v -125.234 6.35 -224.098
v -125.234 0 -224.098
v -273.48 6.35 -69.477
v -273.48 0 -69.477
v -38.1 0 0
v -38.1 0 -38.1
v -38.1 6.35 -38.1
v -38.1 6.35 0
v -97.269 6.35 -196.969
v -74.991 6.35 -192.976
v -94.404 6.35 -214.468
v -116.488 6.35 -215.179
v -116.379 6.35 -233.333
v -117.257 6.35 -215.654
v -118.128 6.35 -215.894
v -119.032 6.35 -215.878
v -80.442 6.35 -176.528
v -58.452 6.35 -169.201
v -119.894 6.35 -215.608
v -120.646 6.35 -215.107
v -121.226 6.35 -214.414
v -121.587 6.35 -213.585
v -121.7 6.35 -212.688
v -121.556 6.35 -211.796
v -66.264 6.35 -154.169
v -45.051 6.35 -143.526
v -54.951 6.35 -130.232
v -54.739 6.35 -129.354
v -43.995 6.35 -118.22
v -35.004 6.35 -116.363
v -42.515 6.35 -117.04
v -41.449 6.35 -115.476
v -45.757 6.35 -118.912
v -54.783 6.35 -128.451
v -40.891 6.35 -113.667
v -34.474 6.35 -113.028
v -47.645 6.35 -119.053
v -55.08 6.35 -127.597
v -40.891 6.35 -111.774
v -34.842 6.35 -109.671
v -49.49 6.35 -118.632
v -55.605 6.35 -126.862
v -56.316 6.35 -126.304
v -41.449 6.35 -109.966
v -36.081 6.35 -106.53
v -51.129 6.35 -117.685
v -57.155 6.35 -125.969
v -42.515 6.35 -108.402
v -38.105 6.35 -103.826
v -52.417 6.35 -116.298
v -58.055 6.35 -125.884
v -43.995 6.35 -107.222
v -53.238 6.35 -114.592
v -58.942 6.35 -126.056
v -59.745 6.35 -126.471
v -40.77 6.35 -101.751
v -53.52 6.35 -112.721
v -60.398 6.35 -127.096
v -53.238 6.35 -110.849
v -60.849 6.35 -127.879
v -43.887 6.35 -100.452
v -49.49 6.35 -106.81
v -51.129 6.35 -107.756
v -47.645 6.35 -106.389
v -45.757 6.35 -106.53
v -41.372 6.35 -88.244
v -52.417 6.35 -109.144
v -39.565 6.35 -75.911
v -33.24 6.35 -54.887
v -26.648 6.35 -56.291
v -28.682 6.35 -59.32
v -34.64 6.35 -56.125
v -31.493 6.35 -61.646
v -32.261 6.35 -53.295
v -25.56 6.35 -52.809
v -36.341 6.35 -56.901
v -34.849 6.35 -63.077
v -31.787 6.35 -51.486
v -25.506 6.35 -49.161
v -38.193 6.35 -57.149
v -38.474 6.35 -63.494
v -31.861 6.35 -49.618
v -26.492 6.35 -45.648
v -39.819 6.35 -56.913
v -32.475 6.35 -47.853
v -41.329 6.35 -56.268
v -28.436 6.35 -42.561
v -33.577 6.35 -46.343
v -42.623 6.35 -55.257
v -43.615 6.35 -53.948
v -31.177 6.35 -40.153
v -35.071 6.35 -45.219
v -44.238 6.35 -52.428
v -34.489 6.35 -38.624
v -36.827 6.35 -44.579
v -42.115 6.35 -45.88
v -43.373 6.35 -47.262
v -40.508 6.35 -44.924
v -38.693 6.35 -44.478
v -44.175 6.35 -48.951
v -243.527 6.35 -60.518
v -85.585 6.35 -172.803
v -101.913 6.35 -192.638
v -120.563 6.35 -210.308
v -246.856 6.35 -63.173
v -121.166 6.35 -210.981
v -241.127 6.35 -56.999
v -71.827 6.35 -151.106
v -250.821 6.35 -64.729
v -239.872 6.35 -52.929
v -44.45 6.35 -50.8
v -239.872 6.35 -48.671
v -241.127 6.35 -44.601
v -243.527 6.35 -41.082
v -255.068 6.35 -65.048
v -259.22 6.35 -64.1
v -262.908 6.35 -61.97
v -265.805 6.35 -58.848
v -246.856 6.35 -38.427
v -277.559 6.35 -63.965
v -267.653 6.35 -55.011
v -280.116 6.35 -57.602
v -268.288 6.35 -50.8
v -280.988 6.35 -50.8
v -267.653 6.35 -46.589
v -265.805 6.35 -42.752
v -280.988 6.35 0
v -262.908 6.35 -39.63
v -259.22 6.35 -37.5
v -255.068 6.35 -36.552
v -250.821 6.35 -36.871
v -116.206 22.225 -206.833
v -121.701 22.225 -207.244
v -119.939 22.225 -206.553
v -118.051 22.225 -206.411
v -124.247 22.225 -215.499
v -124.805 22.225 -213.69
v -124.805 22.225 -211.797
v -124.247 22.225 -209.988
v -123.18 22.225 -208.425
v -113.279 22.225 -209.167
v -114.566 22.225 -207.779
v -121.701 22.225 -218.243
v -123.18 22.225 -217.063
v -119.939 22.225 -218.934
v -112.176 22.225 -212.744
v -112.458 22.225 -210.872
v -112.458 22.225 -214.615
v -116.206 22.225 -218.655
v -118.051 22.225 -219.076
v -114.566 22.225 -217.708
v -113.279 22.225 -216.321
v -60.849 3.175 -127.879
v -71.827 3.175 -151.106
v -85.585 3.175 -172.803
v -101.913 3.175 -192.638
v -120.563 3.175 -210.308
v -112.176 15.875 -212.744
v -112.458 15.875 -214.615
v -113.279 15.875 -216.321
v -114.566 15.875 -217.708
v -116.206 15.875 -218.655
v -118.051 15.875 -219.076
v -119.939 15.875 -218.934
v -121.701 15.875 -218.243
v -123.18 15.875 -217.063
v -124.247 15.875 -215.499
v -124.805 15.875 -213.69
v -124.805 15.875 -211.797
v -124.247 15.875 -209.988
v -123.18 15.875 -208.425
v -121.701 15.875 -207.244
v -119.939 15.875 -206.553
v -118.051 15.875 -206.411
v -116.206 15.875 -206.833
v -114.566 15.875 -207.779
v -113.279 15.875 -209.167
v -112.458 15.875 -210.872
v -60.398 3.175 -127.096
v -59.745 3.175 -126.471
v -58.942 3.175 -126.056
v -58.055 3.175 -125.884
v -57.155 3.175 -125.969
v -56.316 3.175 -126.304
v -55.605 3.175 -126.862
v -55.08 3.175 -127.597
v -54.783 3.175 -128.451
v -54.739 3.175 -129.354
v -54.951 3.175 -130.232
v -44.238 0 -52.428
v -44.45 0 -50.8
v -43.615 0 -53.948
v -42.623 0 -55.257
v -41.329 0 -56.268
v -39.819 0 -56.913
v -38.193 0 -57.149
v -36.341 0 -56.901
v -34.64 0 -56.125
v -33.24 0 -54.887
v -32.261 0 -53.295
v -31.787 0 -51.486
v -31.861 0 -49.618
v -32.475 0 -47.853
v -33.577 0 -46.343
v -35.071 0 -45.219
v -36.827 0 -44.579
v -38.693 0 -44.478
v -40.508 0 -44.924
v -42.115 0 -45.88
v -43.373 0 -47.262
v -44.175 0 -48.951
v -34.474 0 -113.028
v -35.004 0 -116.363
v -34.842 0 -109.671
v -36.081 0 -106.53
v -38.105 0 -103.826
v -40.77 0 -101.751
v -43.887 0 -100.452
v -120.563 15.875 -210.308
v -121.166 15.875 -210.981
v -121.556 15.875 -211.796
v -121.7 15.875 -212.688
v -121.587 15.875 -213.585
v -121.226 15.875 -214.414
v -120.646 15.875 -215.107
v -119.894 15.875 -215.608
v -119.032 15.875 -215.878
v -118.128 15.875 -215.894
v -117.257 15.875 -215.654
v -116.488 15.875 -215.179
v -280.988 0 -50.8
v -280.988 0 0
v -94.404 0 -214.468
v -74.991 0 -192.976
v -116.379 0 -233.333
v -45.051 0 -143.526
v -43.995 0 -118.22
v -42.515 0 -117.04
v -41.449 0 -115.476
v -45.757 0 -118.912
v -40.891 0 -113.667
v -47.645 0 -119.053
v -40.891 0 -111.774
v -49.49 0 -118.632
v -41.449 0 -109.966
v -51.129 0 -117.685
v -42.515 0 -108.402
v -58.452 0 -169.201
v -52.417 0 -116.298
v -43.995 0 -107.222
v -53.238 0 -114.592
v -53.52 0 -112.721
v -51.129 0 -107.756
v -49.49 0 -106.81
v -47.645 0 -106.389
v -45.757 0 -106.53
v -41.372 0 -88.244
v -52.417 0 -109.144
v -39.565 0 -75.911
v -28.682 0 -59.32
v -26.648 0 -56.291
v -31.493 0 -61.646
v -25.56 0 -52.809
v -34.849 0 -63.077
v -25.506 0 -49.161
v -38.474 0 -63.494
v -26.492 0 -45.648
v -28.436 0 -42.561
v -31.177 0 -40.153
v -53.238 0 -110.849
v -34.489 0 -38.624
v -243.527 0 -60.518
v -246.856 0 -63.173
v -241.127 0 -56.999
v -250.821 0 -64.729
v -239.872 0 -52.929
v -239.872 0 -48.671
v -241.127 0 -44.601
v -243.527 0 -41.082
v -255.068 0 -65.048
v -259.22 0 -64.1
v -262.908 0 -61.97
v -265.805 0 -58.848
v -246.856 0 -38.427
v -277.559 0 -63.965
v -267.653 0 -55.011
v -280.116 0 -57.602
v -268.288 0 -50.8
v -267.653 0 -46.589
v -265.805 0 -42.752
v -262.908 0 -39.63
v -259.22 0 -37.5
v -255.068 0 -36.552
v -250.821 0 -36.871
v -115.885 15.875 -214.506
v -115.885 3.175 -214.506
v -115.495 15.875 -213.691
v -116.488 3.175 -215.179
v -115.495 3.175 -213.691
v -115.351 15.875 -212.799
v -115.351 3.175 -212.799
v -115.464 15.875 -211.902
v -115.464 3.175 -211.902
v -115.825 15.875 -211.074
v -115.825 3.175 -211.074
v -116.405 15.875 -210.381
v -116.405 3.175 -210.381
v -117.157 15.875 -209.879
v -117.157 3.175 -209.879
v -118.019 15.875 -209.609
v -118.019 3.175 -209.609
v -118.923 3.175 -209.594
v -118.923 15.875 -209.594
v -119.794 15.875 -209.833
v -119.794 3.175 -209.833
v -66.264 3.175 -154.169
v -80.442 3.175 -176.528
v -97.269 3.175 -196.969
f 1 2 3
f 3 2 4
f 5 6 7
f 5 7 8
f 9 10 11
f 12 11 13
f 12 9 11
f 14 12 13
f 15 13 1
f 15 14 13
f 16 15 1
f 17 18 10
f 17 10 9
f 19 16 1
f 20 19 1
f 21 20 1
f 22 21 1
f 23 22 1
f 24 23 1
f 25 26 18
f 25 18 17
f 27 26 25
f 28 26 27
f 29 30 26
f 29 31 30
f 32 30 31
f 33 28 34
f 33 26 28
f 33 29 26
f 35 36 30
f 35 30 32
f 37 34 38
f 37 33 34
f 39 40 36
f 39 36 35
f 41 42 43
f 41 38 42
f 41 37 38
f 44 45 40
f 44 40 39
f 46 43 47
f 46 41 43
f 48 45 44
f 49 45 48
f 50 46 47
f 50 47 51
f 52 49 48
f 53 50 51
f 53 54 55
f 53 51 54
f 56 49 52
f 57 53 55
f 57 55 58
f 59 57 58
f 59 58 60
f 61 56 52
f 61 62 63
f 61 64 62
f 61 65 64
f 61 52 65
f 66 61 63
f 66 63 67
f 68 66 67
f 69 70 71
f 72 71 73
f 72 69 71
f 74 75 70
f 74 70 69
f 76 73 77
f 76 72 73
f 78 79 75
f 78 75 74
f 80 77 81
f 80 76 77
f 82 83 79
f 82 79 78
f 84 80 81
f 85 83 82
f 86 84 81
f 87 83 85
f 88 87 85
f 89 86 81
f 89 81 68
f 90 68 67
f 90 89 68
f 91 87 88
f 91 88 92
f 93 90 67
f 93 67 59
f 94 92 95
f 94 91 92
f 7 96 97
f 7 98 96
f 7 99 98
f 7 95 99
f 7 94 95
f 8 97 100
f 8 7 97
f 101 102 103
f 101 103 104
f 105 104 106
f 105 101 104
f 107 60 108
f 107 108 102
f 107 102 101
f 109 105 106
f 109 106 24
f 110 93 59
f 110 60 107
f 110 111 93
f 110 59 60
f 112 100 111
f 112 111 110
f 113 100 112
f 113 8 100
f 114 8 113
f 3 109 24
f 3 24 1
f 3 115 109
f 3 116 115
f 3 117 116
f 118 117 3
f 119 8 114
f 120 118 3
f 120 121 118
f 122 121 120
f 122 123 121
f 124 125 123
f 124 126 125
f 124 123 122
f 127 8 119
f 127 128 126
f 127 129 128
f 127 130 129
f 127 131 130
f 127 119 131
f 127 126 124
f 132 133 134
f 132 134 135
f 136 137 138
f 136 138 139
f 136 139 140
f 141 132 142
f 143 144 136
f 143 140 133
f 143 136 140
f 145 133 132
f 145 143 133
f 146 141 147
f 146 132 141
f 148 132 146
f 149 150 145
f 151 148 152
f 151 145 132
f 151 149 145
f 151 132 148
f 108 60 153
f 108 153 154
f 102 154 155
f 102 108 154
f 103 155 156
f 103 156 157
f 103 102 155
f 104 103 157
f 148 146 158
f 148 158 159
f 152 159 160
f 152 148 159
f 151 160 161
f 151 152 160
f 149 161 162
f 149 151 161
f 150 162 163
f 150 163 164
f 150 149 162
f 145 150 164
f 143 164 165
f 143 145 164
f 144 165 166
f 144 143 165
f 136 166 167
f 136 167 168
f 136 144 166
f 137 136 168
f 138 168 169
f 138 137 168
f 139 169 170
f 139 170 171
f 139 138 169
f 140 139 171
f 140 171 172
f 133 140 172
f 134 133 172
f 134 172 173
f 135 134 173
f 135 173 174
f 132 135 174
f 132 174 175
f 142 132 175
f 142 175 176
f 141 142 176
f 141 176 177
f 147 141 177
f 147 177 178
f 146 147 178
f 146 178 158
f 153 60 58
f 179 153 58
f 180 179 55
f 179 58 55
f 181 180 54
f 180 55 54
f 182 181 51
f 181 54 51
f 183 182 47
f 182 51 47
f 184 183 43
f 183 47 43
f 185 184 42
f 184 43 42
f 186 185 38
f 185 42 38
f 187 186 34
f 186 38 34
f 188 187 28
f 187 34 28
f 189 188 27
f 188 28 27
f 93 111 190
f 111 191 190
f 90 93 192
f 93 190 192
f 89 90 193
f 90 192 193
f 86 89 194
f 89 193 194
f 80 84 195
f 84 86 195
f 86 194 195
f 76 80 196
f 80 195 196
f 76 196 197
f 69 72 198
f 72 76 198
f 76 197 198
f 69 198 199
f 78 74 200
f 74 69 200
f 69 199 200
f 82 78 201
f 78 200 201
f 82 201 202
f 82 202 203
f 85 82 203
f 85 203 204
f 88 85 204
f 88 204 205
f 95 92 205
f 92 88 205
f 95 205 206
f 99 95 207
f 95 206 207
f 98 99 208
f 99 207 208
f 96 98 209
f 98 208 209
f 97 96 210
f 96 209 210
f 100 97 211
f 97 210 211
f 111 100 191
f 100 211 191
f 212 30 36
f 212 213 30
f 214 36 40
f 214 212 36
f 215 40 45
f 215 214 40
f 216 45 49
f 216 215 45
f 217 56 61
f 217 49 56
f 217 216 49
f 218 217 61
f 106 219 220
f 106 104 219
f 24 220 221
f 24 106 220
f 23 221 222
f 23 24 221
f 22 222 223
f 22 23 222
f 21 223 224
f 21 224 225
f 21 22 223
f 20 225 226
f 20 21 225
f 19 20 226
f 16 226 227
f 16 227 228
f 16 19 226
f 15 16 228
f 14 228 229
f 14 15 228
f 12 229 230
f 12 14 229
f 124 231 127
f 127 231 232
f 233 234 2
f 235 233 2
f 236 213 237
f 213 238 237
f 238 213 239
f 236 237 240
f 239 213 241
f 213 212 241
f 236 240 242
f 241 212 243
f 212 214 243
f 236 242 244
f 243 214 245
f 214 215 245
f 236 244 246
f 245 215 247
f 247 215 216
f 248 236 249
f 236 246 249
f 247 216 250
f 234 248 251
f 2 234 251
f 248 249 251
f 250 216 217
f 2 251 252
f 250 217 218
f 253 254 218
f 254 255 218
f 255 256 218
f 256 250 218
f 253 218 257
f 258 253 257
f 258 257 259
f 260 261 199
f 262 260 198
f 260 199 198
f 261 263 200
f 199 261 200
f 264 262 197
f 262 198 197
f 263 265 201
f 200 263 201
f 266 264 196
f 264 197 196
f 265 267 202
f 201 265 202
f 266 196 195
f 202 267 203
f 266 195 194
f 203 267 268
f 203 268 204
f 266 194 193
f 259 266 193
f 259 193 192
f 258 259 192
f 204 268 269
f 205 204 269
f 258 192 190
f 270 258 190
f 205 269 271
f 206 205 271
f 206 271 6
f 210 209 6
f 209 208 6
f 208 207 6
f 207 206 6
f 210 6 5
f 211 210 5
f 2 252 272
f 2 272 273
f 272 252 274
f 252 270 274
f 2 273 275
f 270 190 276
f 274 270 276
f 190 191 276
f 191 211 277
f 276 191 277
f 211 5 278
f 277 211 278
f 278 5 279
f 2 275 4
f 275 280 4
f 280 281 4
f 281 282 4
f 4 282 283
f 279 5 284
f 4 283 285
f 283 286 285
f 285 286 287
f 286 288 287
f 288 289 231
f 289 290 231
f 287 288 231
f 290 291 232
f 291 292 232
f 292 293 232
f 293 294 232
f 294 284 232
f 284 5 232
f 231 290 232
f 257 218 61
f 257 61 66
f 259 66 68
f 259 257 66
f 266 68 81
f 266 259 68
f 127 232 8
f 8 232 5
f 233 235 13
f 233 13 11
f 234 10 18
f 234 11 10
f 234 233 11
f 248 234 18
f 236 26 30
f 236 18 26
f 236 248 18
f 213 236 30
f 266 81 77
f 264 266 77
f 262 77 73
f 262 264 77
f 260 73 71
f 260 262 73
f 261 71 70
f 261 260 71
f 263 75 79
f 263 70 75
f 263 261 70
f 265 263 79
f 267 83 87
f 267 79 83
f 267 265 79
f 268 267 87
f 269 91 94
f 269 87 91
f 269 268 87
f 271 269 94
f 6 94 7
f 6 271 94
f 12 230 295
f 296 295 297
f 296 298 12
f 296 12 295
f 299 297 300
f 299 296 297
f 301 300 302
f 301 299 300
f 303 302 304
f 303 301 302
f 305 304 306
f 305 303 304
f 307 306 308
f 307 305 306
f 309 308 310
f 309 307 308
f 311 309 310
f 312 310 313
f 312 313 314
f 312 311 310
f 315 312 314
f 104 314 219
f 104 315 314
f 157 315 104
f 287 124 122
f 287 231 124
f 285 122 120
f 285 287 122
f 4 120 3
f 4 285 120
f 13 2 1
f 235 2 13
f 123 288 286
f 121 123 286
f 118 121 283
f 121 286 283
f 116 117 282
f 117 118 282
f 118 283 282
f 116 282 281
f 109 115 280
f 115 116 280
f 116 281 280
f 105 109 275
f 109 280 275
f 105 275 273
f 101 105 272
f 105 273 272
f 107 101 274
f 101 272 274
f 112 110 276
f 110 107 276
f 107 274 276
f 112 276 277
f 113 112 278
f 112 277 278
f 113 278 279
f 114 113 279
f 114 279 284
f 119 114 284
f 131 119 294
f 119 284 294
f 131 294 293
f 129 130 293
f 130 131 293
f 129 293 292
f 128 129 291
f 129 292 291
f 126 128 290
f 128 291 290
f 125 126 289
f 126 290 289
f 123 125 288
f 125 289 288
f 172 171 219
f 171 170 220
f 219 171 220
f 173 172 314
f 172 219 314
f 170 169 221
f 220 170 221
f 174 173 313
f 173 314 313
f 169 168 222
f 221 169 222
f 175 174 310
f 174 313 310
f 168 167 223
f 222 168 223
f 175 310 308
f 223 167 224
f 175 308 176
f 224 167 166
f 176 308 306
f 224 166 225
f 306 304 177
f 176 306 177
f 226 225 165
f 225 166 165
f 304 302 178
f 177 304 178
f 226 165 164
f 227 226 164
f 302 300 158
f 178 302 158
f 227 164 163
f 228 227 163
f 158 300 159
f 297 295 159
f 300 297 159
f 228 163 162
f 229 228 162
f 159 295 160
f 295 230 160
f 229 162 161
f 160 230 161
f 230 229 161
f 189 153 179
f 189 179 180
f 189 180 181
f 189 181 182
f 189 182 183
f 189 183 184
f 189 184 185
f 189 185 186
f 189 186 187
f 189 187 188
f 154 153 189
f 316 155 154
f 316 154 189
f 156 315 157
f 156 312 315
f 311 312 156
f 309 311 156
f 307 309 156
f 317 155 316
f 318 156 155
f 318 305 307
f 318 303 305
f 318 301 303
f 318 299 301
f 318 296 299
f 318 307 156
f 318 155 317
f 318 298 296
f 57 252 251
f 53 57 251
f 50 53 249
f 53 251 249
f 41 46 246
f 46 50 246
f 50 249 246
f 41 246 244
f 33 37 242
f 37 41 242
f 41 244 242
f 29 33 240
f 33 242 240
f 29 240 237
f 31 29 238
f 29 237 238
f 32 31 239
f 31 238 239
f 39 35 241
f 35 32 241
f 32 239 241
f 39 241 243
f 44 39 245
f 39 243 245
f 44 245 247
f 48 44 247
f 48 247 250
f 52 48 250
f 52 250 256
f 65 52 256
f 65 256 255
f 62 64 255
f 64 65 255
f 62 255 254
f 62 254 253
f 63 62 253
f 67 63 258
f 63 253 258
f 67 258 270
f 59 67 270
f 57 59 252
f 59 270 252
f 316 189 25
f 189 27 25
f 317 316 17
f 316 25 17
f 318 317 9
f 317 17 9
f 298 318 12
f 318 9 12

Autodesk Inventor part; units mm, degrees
ref_plane "YZ Plane" through (0, 0, 0) normal (1, 0, 0) x (0, 1, 0)
ref_plane "XZ Plane" through (0, 0, 0) normal (0, 1, 0) x (-1, 0, 0)
sketch "Sketch1" plane through (0, 0, 0) normal (0, 1, 0) x (-1, 0, 0)
  circle A0 centre (254, -50.8) radius 14.2875
  arc A1 (38.4735, -38.1055) -> (38.4735, -63.4945) centre (38.1, -50.8) ccw
  line L0 (280.9875, -50.8) -> (280.9875, 0)
  line L1 (280.9875, 0) -> (280.9875, -50.8)
  line L2 (280.9875, 0) -> (38.1, 0)
  line L3 (38.1, -38.1) -> (38.1, 0)
  arc A2 (38.4735, -63.4945) -> (43.8871, -100.4525) centre (254, -50.8) ccw
  arc A3 (51.1687, -124.7749) -> (66.9545, -158.6276) centre (254, -50.8) ccw
  arc A4 (80.906, -179.8398) -> (105.7377, -207.743) centre (254, -50.8) ccw
  arc A5 (273.4803, -69.4773) -> (280.9875, -50.8) centre (254, -50.8) ccw
  line L4 (125.2338, -224.0976) -> (273.4803, -69.4773)
  line L5 (280.9875, 0) -> (38.1, 0)
  line L6 (38.1, 0) -> (38.1, -38.1)
  line L7 (280.9875, 0) -> (280.9875, -50.8)
  circle A6 centre (47.1701, -112.7208) radius 6.35
  circle A7 centre (38.1, -50.8) radius 6.35
  arc A8 (43.8871, -100.4525) -> (51.1687, -124.7749) centre (47.1701, -112.7208) ccw
  arc A9 (38.4735, -38.1055) -> (38.4735, -63.4945) centre (38.1, -50.8) ccw
  arc A10 (43.8871, -100.4525) -> (51.1687, -124.7749) centre (47.1701, -112.7208) ccw
  line L8 (38.1, 0) -> (50.8, 0)
  line L9 (38.4739, -38.1) -> (38.1, -38.1)
  line L10 (38.1, -38.1) -> (38.1, 0)
  circle A11 centre (254, -50.8) radius 14.2875
  circle A12 centre (47.1701, -112.7208) radius 6.35
  circle A13 centre (38.1, -50.8) radius 6.35
  arc A14 (51.1687, -124.7749) -> (125.2338, -224.0976) centre (254, -50.8) ccw
  arc A15 (38.1934, -57.1493) -> (43.8871, -100.4525) centre (254, -50.8) ccw
  arc A16 (35.0036, -116.3632) -> (116.3789, -233.3332) centre (254, -50.8) ccw
  line L11 (125.2338, -224.0976) -> (116.3789, -233.3332)
  point P0 (0, 0)
  point P1 (44.1616, 0)
  point P2 (38.1934, -44.4507)
  dimension "d4" = 28.575
  dimension "d32" = 25.4
  dimension "d36" = 50.8
  dimension "d74" = 53.975
  dimension "d79" = 12.7
  dimension "d83" = 26.9875
ref_plane "Work Plane1" through (0, 6.35, 0) normal (0, 1, 0) x (1, 0, 0)
extrude "Extrusion7" add sketch "Sketch1" along normal blind 6.35
sketch "Sketch4" plane through (0, 6.35, 0) normal (0, 1, 0) x (1, 0, 0)
  arc A0 (-116.4883, 215.1788) -> (-120.5628, 210.3083) centre (-118.5256, 212.7436) ccw projected
  arc A1 (-116.4883, 215.1788) -> (-120.5628, 210.3083) centre (-118.5256, 212.7436) ccw
  arc A2 (-60.849, 127.8786) -> (-54.9513, 130.2322) centre (-57.9002, 129.0554) ccw projected
  arc A3 (-60.849, 127.8786) -> (-54.9513, 130.2322) centre (-57.9002, 129.0554) ccw
  circle A4 centre (-254, 50.8) radius 14.2875 projected
  arc A5 (-54.9513, 130.2322) -> (-116.4883, 215.1788) centre (-254, 50.8) ccw projected
  arc A6 (-54.9513, 130.2322) -> (-116.4883, 215.1788) centre (-254, 50.8) ccw
  arc A7 (-60.849, 127.8786) -> (-120.5628, 210.3083) centre (-254, 50.8) ccw
  point P0 (0, 0)
extrude "Extrusion9" cut sketch "Sketch4" against normal blind 3.175 contours A5 A2 A7 A0
sketch "Sketch5" plane through (0, 3.175, 0) normal (0, 1, 0) x (1, 0, 0)
  arc A0 (-116.4883, 215.1788) -> (-120.5628, 210.3083) centre (-118.5256, 212.7436) ccw projected
  circle A1 centre (-118.5256, 212.7436) radius 3.175
  point P0 (0, 0)
extrude "Extrusion10" add sketch "Sketch5" along normal blind 19.05
sketch "Sketch6" plane through (-118.5256, 22.225, -212.7436) normal (0, 1, 0) x (1, 0, 0)
  arc A0 (2.0372, 2.4352) -> (-2.0372, -2.4352) centre (0, 0) ccw projected
  circle A1 centre (0, 0) radius 6.35
  point P0 (118.5256, -212.7436)
  dimension "d110" = 12.7
extrude "Extrusion11" add sketch "Sketch6" against normal blind 6.35
properties part number "Hood panel" material "Aluminum 6061"
